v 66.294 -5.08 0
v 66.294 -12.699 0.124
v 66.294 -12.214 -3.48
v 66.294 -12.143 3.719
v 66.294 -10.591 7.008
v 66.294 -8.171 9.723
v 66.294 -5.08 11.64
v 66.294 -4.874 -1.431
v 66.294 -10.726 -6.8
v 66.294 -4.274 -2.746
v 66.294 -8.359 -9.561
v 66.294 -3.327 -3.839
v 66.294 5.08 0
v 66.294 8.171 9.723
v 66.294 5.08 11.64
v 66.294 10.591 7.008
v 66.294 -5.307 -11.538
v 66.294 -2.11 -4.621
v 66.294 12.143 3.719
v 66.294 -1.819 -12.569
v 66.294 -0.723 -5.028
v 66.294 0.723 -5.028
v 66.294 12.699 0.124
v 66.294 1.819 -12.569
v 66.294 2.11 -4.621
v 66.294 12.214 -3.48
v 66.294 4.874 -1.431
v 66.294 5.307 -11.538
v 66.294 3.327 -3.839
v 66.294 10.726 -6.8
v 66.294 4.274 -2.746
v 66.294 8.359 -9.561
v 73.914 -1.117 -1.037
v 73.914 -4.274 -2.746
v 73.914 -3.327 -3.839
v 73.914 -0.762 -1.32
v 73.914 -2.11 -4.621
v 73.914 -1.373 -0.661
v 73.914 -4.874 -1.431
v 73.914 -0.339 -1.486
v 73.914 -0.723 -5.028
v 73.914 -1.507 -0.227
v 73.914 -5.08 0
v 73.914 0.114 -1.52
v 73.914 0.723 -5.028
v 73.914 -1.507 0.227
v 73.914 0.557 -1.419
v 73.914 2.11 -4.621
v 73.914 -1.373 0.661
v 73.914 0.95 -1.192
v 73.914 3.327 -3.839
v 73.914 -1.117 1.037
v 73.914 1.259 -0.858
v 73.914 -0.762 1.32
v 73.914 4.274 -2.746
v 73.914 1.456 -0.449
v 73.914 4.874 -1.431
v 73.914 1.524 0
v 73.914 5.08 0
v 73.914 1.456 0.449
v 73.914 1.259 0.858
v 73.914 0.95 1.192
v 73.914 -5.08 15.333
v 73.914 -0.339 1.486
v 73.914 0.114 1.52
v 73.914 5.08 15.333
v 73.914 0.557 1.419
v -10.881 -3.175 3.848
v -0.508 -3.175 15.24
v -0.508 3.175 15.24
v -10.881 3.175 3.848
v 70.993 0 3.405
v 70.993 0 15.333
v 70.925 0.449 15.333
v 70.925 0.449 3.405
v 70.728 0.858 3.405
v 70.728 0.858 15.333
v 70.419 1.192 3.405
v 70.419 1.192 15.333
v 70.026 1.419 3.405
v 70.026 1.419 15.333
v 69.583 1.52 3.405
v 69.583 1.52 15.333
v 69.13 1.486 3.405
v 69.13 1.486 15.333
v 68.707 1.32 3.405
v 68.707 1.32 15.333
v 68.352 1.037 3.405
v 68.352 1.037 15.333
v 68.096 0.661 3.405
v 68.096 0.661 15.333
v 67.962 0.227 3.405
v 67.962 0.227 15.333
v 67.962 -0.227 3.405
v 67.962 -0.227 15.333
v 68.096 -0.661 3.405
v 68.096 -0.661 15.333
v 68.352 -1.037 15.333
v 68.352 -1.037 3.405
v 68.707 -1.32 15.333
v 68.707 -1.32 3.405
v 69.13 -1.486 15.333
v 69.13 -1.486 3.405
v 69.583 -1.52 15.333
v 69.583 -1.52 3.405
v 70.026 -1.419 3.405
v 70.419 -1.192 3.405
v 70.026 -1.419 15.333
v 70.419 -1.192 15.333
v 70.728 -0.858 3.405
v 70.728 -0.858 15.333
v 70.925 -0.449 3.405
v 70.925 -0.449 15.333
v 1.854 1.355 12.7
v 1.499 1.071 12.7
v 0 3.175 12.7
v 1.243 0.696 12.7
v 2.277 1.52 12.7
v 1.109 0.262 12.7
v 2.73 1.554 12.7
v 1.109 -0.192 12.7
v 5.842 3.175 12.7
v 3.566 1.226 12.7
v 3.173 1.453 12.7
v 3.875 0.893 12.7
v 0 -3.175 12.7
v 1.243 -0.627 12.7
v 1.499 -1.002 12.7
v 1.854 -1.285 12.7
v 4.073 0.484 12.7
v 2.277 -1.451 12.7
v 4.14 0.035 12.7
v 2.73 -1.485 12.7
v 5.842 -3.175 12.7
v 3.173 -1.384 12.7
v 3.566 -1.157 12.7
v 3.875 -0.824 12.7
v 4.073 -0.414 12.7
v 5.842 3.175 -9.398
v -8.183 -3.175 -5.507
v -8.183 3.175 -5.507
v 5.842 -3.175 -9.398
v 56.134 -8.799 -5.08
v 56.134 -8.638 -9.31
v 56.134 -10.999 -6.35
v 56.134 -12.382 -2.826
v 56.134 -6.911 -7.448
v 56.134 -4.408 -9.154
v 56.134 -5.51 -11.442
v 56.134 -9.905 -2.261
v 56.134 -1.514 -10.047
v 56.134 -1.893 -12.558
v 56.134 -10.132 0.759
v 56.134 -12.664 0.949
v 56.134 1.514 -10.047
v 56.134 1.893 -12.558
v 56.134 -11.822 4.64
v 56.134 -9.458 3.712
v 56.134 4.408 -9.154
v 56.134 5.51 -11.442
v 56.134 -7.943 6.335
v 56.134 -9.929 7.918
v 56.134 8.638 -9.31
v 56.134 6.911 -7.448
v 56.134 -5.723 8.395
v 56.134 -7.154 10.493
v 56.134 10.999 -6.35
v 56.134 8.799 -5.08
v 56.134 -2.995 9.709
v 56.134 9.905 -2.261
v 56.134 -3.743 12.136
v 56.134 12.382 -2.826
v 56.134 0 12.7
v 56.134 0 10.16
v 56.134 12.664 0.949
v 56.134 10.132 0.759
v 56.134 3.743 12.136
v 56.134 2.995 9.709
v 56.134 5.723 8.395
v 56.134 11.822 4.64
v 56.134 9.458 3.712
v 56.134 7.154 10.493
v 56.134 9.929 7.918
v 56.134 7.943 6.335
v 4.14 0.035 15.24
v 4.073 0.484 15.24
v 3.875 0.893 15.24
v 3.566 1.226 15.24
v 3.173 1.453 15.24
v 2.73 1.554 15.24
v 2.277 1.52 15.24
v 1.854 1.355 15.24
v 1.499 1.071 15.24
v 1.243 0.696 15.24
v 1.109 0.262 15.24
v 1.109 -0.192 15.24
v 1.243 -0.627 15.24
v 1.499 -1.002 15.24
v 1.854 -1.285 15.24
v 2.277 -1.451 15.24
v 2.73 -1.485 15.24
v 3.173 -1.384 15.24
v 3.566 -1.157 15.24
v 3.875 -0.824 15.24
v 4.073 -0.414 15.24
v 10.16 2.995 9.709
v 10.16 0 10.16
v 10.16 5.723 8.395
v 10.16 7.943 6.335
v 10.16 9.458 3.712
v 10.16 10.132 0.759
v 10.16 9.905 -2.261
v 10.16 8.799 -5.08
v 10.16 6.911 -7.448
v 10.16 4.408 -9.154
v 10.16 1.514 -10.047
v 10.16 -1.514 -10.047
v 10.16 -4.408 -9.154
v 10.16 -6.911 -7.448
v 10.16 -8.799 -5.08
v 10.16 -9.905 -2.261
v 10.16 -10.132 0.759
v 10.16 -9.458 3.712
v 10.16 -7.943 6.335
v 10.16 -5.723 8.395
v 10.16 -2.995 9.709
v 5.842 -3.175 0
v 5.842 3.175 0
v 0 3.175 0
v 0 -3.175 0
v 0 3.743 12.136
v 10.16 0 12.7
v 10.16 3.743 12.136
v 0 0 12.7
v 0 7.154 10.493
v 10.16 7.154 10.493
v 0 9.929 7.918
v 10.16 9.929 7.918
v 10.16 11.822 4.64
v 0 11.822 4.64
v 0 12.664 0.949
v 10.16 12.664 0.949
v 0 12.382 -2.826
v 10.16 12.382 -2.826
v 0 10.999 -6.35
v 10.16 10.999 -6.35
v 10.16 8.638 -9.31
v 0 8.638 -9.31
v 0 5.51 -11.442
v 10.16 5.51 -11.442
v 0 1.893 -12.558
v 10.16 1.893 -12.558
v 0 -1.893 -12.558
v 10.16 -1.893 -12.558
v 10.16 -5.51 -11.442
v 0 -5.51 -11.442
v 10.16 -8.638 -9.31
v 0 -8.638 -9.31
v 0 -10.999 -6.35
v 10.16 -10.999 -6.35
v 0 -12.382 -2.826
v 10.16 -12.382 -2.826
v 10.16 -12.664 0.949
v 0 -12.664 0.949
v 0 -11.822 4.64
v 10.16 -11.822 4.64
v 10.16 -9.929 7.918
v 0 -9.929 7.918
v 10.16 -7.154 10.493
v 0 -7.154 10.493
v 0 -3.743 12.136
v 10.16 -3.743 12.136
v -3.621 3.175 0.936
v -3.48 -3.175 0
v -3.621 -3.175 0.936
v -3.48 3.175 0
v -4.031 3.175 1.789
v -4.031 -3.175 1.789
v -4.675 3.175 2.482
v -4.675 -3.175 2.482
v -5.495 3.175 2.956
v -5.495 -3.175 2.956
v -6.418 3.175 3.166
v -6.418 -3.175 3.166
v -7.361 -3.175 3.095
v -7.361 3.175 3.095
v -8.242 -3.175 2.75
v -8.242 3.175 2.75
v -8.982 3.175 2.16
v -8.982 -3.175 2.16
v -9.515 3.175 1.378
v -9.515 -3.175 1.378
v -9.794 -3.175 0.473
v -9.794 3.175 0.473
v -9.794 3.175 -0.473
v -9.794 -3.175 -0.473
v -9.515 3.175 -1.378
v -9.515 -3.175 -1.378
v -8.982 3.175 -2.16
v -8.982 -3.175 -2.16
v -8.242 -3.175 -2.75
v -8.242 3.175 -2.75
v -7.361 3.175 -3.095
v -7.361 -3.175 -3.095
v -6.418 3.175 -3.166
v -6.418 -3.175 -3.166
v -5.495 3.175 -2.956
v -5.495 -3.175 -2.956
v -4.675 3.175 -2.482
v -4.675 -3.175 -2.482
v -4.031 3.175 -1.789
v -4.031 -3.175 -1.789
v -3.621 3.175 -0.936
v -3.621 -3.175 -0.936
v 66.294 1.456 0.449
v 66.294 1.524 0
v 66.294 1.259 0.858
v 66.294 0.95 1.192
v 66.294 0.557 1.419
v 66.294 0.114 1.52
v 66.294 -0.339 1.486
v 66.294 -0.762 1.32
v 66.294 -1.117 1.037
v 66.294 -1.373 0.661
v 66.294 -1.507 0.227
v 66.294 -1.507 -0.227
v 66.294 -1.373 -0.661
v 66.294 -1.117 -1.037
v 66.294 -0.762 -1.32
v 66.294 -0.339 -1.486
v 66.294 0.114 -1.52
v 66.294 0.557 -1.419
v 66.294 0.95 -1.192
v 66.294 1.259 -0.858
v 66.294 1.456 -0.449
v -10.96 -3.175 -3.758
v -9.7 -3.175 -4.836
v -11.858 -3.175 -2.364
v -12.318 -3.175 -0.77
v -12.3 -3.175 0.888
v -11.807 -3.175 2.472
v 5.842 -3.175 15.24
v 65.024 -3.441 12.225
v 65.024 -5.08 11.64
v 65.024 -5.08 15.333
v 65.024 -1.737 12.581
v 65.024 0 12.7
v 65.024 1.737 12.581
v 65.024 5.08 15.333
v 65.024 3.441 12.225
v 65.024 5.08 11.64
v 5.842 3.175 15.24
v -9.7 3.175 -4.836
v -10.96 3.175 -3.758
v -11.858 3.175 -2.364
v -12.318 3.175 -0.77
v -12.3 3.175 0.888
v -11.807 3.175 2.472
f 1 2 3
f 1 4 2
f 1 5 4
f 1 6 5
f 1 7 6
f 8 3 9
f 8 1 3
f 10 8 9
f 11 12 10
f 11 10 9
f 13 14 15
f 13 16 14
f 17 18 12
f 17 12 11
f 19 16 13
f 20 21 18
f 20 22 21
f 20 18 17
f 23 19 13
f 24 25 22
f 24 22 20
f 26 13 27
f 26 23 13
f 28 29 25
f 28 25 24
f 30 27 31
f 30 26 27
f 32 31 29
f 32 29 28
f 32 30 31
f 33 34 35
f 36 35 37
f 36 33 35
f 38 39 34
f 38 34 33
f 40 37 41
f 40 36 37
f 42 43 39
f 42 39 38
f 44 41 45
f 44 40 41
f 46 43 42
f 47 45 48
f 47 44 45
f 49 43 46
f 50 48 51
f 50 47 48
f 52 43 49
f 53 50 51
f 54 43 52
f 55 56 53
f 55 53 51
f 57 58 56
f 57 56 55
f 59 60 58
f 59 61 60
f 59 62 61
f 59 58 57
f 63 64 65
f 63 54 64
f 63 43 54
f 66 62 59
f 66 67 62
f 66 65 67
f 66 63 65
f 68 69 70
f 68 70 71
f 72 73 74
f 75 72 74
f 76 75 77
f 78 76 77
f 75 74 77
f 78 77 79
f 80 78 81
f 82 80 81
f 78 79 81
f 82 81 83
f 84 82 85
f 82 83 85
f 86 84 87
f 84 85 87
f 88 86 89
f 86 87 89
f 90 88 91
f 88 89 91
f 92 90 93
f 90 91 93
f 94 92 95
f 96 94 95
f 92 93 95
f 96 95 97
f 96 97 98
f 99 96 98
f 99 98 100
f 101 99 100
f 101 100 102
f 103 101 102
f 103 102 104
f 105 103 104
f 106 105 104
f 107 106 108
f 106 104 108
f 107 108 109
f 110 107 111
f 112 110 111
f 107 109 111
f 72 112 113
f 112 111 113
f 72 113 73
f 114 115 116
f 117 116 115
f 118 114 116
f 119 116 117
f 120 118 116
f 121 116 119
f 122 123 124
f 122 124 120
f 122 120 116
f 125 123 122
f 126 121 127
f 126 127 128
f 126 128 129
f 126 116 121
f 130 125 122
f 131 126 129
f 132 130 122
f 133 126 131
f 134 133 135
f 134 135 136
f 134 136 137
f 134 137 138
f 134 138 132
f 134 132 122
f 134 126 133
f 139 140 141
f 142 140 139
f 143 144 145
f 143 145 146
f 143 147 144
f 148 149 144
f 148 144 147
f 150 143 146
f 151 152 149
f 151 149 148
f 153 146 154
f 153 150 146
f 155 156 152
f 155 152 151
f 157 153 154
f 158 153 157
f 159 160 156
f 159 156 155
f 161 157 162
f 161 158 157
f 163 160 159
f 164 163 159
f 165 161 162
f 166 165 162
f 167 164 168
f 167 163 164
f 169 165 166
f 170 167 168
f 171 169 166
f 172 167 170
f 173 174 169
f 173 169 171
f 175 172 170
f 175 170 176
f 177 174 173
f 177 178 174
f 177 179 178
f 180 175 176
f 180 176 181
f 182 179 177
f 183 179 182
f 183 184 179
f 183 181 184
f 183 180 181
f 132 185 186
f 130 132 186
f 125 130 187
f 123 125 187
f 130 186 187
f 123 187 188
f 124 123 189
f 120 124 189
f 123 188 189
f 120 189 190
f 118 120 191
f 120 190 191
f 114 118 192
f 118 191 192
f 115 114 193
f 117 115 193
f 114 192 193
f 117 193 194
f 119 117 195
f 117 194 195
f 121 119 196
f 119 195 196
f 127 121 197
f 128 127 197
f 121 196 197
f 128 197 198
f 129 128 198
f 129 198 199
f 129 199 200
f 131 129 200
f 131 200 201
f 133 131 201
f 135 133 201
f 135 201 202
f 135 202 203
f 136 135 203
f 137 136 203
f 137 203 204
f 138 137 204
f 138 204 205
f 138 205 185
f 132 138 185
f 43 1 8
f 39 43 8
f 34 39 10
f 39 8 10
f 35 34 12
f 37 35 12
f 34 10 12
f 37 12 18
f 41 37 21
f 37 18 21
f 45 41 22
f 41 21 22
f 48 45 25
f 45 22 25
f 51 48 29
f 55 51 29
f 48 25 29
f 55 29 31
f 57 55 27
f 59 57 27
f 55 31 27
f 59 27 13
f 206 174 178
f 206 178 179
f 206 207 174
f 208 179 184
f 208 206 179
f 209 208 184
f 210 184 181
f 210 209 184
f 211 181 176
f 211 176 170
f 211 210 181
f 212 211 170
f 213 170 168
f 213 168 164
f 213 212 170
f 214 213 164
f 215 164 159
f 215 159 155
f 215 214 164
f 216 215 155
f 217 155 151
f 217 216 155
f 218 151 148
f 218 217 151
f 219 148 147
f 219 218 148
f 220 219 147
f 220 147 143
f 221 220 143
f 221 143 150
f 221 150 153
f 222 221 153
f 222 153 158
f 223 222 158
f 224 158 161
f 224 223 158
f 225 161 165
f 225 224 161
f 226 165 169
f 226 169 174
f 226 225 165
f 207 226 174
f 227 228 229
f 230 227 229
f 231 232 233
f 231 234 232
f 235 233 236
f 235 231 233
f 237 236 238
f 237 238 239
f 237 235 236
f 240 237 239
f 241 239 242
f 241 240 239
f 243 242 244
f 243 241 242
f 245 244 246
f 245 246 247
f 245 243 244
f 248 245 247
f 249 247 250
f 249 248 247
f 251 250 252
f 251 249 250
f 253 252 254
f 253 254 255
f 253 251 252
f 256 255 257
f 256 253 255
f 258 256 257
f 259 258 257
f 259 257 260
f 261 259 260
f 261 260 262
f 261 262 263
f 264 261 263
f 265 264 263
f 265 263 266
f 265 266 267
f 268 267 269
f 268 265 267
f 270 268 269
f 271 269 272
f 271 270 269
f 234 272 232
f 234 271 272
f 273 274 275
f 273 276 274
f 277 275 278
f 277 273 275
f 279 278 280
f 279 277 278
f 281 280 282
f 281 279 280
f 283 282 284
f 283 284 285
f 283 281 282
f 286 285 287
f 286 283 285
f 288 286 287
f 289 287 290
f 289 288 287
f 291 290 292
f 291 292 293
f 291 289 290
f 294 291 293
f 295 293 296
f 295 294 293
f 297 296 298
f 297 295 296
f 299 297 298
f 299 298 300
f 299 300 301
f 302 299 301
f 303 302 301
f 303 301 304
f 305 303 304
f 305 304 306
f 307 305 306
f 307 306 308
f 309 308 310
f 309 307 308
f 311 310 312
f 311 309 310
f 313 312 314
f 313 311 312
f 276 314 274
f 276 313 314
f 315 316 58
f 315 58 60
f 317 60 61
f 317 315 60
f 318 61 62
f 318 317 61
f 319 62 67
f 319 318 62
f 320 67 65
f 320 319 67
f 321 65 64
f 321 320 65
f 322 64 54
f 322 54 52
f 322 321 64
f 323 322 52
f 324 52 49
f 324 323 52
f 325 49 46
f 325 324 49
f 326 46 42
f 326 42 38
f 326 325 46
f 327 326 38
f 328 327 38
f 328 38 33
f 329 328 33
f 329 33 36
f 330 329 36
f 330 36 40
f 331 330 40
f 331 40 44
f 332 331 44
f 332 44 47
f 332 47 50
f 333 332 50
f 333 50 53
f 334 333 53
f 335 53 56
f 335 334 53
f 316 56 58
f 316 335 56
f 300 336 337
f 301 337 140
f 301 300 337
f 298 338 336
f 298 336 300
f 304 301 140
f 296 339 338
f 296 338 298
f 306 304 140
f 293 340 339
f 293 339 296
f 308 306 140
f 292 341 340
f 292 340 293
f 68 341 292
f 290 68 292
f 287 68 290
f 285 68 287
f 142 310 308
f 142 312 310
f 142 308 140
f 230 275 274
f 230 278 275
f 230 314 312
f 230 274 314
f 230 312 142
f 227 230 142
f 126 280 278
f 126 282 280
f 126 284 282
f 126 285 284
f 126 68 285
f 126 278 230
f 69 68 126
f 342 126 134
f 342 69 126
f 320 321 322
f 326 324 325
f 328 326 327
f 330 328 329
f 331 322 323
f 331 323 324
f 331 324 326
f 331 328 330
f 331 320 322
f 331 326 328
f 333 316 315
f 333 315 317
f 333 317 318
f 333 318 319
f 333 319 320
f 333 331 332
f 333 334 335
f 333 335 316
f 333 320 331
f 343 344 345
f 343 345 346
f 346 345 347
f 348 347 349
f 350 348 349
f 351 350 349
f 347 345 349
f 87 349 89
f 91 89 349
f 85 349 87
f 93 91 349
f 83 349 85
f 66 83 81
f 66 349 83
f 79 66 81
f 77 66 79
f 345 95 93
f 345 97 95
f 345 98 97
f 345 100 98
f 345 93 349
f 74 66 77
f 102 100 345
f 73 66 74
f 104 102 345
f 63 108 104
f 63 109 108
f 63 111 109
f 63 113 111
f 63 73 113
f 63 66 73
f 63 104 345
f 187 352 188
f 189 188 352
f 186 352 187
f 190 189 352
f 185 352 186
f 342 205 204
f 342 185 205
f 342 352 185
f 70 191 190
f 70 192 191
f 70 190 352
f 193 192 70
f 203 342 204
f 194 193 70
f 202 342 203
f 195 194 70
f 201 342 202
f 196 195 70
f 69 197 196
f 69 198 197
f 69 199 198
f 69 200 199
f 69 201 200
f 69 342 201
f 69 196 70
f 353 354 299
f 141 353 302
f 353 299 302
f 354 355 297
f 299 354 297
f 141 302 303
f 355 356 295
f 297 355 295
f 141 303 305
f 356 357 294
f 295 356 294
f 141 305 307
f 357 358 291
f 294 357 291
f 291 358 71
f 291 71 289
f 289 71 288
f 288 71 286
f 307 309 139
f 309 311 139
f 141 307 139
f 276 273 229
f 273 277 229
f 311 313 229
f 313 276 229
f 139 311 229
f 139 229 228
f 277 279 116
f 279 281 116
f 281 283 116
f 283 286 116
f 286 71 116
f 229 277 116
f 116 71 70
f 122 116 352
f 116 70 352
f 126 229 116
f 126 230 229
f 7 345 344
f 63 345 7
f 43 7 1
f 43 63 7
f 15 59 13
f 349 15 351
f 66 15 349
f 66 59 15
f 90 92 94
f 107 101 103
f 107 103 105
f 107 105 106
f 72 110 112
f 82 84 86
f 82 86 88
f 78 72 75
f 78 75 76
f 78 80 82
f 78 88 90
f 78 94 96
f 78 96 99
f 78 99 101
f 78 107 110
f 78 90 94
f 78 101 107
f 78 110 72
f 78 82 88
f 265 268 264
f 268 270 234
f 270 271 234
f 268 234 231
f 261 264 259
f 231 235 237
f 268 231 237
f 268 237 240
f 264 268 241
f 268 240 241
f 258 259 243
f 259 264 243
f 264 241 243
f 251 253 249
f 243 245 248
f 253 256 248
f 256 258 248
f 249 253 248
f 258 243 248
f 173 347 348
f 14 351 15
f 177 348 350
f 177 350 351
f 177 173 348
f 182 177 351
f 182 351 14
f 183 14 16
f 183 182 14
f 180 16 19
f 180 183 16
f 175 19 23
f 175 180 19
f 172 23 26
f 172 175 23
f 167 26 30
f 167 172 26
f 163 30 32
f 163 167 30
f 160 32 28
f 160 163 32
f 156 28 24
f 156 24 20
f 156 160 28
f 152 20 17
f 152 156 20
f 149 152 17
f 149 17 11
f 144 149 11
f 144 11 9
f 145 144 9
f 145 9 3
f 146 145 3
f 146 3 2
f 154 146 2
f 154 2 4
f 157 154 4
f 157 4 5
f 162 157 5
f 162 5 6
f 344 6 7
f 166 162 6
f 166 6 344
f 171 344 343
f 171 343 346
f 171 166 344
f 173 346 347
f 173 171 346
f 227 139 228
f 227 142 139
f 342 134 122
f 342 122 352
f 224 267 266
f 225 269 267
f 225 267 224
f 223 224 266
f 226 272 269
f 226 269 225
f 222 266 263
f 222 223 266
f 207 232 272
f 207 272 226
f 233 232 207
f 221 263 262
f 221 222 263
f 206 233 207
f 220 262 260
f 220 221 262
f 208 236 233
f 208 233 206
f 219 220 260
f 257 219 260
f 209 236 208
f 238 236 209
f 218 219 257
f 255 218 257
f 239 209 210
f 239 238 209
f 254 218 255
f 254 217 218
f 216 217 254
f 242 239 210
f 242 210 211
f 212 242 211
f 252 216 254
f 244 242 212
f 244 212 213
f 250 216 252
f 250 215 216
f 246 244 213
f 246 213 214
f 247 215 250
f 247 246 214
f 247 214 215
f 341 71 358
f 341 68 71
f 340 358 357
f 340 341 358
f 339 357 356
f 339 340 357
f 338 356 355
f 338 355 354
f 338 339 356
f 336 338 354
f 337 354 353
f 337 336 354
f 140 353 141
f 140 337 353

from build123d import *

# Parameters (mm, degrees)
F0_W      = 5.842
F0_H      = 12.7
F0_R      = 3.175
F3_DEPTH  = 3.175
F4_R      = 1.524
F5_DEPTH  = 7.62
F6_DEPTH  = 1.27
F8_R      = 1.524
F9_DEPTH  = 10.414
F10_DEPTH = 11.9279641658
F7_R      = 1.524
F11_DEPTH = 9.9806375802


with BuildPart() as f2:
    # F0 (on Front) → F2 (revolve)
    with BuildSketch(Plane.XZ):
        Polygon((5.842, 12.7), (5.842, 0), (66.294, 0), (66.294, 12.7), (56.134, 12.7), (56.134, 10.16), (10.16, 10.16), (10.16, 12.7), align=None)
        with Locations((2.921, 6.35)):
            Rectangle(F0_W, F0_H)
    revolve(axis=Axis((33.147, 0, 0), (-1, 0, 0)))

    # F4 (on face) → F5 (join)
    with BuildSketch(Plane.YZ.offset(66.294)):
        with BuildLine():
            ThreePointArc((-5.08, 0), (0, -5.08), (5.08, 0))
            ThreePointArc((5.08, 0), (0, 5.08), (-5.08, 0))
        make_face()
        Circle(F4_R, mode=Mode.SUBTRACT)
        with BuildLine():
            ThreePointArc((-5.08, 0), (0, 5.08), (5.08, 0))
            Line((5.08, 0), (5.08, 15.3334243223))
            Line((5.08, 15.3334243223), (-5.08, 15.3334243223))
            Line((-5.08, 15.3334243223), (-5.08, 0))
        make_face()
    extrude(amount=F5_DEPTH)

    # F6 (add): a face of the model
    f6_faces = [f2.faces().sort_by_distance(p)[0] for p in [
        (66.294, 0, 13.8265158547),
    ]]
    extrude(f6_faces, amount=F6_DEPTH)

    # F8 (on face) → F9 (join)
    with BuildSketch(Plane.XY.offset(15.3334243223)):
        with Locations((69.469, 0)):
            Circle(F8_R)
    extrude(amount=-F9_DEPTH)

    # F8 (on face) → F10 (cut)
    with BuildSketch(Plane.XY.offset(15.3334243223)):
        with Locations((69.469, 0)):
            Circle(F8_R)
    extrude(amount=-F10_DEPTH, mode=Mode.SUBTRACT)


with BuildPart() as f3:
    # F0 (on Front) → F3 (new body, symmetric)
    with BuildSketch(Plane.XZ):
        with BuildLine():
            Line((-0.9398, 0), (0, 0))
            Line((0, 0), (0, 12.7))
            Line((0, 12.7), (5.842, 12.7))
            Line((5.842, 12.7), (5.842, 15.24))
            Line((5.842, 15.24), (-0.508, 15.24))
            Line((-0.508, 15.24), (-10.8806298187, 3.8475430269))
            ThreePointArc((-10.8806298187, 3.8475430269), (-4.5919612295, 5.3297205562), (-0.9398, 0))
        make_face()
        with BuildLine():
            Line((5.842, 0), (0, 0))
            Line((0, 0), (-0.9398, 0))
            ThreePointArc((-0.9398, 0), (-3.1957909266, -4.5493385486), (-8.1826630726, -5.5069827884))
            Line((-8.1826630726, -5.5069827884), (5.842, -9.398))
            Line((5.842, -9.398), (5.842, 0))
        make_face()
        with BuildLine():
            ThreePointArc((-8.1826630726, -5.5069827884), (-3.1957909266, -4.5493385486), (-0.9398, 0))
            ThreePointArc((-0.9398, 0), (-4.5919612295, 5.3297205562), (-10.8806298187, 3.8475430269))
            ThreePointArc((-10.8806298187, 3.8475430269), (-12.1459778134, -1.5837270034), (-8.1826630726, -5.5069827884))
        make_face()
        with Locations((-6.6548, 0)):
            Circle(F0_R, mode=Mode.SUBTRACT)
    extrude(amount=F3_DEPTH, both=True)

    # F7 (on face) → F11 (cut)
    with BuildSketch(Plane.XY.offset(15.24)):
        with Locations((2.6162154973, 0.0347092391)):
            Circle(F7_R)
    extrude(amount=-F11_DEPTH, mode=Mode.SUBTRACT)


solid = Compound([f2.part, f3.part])
